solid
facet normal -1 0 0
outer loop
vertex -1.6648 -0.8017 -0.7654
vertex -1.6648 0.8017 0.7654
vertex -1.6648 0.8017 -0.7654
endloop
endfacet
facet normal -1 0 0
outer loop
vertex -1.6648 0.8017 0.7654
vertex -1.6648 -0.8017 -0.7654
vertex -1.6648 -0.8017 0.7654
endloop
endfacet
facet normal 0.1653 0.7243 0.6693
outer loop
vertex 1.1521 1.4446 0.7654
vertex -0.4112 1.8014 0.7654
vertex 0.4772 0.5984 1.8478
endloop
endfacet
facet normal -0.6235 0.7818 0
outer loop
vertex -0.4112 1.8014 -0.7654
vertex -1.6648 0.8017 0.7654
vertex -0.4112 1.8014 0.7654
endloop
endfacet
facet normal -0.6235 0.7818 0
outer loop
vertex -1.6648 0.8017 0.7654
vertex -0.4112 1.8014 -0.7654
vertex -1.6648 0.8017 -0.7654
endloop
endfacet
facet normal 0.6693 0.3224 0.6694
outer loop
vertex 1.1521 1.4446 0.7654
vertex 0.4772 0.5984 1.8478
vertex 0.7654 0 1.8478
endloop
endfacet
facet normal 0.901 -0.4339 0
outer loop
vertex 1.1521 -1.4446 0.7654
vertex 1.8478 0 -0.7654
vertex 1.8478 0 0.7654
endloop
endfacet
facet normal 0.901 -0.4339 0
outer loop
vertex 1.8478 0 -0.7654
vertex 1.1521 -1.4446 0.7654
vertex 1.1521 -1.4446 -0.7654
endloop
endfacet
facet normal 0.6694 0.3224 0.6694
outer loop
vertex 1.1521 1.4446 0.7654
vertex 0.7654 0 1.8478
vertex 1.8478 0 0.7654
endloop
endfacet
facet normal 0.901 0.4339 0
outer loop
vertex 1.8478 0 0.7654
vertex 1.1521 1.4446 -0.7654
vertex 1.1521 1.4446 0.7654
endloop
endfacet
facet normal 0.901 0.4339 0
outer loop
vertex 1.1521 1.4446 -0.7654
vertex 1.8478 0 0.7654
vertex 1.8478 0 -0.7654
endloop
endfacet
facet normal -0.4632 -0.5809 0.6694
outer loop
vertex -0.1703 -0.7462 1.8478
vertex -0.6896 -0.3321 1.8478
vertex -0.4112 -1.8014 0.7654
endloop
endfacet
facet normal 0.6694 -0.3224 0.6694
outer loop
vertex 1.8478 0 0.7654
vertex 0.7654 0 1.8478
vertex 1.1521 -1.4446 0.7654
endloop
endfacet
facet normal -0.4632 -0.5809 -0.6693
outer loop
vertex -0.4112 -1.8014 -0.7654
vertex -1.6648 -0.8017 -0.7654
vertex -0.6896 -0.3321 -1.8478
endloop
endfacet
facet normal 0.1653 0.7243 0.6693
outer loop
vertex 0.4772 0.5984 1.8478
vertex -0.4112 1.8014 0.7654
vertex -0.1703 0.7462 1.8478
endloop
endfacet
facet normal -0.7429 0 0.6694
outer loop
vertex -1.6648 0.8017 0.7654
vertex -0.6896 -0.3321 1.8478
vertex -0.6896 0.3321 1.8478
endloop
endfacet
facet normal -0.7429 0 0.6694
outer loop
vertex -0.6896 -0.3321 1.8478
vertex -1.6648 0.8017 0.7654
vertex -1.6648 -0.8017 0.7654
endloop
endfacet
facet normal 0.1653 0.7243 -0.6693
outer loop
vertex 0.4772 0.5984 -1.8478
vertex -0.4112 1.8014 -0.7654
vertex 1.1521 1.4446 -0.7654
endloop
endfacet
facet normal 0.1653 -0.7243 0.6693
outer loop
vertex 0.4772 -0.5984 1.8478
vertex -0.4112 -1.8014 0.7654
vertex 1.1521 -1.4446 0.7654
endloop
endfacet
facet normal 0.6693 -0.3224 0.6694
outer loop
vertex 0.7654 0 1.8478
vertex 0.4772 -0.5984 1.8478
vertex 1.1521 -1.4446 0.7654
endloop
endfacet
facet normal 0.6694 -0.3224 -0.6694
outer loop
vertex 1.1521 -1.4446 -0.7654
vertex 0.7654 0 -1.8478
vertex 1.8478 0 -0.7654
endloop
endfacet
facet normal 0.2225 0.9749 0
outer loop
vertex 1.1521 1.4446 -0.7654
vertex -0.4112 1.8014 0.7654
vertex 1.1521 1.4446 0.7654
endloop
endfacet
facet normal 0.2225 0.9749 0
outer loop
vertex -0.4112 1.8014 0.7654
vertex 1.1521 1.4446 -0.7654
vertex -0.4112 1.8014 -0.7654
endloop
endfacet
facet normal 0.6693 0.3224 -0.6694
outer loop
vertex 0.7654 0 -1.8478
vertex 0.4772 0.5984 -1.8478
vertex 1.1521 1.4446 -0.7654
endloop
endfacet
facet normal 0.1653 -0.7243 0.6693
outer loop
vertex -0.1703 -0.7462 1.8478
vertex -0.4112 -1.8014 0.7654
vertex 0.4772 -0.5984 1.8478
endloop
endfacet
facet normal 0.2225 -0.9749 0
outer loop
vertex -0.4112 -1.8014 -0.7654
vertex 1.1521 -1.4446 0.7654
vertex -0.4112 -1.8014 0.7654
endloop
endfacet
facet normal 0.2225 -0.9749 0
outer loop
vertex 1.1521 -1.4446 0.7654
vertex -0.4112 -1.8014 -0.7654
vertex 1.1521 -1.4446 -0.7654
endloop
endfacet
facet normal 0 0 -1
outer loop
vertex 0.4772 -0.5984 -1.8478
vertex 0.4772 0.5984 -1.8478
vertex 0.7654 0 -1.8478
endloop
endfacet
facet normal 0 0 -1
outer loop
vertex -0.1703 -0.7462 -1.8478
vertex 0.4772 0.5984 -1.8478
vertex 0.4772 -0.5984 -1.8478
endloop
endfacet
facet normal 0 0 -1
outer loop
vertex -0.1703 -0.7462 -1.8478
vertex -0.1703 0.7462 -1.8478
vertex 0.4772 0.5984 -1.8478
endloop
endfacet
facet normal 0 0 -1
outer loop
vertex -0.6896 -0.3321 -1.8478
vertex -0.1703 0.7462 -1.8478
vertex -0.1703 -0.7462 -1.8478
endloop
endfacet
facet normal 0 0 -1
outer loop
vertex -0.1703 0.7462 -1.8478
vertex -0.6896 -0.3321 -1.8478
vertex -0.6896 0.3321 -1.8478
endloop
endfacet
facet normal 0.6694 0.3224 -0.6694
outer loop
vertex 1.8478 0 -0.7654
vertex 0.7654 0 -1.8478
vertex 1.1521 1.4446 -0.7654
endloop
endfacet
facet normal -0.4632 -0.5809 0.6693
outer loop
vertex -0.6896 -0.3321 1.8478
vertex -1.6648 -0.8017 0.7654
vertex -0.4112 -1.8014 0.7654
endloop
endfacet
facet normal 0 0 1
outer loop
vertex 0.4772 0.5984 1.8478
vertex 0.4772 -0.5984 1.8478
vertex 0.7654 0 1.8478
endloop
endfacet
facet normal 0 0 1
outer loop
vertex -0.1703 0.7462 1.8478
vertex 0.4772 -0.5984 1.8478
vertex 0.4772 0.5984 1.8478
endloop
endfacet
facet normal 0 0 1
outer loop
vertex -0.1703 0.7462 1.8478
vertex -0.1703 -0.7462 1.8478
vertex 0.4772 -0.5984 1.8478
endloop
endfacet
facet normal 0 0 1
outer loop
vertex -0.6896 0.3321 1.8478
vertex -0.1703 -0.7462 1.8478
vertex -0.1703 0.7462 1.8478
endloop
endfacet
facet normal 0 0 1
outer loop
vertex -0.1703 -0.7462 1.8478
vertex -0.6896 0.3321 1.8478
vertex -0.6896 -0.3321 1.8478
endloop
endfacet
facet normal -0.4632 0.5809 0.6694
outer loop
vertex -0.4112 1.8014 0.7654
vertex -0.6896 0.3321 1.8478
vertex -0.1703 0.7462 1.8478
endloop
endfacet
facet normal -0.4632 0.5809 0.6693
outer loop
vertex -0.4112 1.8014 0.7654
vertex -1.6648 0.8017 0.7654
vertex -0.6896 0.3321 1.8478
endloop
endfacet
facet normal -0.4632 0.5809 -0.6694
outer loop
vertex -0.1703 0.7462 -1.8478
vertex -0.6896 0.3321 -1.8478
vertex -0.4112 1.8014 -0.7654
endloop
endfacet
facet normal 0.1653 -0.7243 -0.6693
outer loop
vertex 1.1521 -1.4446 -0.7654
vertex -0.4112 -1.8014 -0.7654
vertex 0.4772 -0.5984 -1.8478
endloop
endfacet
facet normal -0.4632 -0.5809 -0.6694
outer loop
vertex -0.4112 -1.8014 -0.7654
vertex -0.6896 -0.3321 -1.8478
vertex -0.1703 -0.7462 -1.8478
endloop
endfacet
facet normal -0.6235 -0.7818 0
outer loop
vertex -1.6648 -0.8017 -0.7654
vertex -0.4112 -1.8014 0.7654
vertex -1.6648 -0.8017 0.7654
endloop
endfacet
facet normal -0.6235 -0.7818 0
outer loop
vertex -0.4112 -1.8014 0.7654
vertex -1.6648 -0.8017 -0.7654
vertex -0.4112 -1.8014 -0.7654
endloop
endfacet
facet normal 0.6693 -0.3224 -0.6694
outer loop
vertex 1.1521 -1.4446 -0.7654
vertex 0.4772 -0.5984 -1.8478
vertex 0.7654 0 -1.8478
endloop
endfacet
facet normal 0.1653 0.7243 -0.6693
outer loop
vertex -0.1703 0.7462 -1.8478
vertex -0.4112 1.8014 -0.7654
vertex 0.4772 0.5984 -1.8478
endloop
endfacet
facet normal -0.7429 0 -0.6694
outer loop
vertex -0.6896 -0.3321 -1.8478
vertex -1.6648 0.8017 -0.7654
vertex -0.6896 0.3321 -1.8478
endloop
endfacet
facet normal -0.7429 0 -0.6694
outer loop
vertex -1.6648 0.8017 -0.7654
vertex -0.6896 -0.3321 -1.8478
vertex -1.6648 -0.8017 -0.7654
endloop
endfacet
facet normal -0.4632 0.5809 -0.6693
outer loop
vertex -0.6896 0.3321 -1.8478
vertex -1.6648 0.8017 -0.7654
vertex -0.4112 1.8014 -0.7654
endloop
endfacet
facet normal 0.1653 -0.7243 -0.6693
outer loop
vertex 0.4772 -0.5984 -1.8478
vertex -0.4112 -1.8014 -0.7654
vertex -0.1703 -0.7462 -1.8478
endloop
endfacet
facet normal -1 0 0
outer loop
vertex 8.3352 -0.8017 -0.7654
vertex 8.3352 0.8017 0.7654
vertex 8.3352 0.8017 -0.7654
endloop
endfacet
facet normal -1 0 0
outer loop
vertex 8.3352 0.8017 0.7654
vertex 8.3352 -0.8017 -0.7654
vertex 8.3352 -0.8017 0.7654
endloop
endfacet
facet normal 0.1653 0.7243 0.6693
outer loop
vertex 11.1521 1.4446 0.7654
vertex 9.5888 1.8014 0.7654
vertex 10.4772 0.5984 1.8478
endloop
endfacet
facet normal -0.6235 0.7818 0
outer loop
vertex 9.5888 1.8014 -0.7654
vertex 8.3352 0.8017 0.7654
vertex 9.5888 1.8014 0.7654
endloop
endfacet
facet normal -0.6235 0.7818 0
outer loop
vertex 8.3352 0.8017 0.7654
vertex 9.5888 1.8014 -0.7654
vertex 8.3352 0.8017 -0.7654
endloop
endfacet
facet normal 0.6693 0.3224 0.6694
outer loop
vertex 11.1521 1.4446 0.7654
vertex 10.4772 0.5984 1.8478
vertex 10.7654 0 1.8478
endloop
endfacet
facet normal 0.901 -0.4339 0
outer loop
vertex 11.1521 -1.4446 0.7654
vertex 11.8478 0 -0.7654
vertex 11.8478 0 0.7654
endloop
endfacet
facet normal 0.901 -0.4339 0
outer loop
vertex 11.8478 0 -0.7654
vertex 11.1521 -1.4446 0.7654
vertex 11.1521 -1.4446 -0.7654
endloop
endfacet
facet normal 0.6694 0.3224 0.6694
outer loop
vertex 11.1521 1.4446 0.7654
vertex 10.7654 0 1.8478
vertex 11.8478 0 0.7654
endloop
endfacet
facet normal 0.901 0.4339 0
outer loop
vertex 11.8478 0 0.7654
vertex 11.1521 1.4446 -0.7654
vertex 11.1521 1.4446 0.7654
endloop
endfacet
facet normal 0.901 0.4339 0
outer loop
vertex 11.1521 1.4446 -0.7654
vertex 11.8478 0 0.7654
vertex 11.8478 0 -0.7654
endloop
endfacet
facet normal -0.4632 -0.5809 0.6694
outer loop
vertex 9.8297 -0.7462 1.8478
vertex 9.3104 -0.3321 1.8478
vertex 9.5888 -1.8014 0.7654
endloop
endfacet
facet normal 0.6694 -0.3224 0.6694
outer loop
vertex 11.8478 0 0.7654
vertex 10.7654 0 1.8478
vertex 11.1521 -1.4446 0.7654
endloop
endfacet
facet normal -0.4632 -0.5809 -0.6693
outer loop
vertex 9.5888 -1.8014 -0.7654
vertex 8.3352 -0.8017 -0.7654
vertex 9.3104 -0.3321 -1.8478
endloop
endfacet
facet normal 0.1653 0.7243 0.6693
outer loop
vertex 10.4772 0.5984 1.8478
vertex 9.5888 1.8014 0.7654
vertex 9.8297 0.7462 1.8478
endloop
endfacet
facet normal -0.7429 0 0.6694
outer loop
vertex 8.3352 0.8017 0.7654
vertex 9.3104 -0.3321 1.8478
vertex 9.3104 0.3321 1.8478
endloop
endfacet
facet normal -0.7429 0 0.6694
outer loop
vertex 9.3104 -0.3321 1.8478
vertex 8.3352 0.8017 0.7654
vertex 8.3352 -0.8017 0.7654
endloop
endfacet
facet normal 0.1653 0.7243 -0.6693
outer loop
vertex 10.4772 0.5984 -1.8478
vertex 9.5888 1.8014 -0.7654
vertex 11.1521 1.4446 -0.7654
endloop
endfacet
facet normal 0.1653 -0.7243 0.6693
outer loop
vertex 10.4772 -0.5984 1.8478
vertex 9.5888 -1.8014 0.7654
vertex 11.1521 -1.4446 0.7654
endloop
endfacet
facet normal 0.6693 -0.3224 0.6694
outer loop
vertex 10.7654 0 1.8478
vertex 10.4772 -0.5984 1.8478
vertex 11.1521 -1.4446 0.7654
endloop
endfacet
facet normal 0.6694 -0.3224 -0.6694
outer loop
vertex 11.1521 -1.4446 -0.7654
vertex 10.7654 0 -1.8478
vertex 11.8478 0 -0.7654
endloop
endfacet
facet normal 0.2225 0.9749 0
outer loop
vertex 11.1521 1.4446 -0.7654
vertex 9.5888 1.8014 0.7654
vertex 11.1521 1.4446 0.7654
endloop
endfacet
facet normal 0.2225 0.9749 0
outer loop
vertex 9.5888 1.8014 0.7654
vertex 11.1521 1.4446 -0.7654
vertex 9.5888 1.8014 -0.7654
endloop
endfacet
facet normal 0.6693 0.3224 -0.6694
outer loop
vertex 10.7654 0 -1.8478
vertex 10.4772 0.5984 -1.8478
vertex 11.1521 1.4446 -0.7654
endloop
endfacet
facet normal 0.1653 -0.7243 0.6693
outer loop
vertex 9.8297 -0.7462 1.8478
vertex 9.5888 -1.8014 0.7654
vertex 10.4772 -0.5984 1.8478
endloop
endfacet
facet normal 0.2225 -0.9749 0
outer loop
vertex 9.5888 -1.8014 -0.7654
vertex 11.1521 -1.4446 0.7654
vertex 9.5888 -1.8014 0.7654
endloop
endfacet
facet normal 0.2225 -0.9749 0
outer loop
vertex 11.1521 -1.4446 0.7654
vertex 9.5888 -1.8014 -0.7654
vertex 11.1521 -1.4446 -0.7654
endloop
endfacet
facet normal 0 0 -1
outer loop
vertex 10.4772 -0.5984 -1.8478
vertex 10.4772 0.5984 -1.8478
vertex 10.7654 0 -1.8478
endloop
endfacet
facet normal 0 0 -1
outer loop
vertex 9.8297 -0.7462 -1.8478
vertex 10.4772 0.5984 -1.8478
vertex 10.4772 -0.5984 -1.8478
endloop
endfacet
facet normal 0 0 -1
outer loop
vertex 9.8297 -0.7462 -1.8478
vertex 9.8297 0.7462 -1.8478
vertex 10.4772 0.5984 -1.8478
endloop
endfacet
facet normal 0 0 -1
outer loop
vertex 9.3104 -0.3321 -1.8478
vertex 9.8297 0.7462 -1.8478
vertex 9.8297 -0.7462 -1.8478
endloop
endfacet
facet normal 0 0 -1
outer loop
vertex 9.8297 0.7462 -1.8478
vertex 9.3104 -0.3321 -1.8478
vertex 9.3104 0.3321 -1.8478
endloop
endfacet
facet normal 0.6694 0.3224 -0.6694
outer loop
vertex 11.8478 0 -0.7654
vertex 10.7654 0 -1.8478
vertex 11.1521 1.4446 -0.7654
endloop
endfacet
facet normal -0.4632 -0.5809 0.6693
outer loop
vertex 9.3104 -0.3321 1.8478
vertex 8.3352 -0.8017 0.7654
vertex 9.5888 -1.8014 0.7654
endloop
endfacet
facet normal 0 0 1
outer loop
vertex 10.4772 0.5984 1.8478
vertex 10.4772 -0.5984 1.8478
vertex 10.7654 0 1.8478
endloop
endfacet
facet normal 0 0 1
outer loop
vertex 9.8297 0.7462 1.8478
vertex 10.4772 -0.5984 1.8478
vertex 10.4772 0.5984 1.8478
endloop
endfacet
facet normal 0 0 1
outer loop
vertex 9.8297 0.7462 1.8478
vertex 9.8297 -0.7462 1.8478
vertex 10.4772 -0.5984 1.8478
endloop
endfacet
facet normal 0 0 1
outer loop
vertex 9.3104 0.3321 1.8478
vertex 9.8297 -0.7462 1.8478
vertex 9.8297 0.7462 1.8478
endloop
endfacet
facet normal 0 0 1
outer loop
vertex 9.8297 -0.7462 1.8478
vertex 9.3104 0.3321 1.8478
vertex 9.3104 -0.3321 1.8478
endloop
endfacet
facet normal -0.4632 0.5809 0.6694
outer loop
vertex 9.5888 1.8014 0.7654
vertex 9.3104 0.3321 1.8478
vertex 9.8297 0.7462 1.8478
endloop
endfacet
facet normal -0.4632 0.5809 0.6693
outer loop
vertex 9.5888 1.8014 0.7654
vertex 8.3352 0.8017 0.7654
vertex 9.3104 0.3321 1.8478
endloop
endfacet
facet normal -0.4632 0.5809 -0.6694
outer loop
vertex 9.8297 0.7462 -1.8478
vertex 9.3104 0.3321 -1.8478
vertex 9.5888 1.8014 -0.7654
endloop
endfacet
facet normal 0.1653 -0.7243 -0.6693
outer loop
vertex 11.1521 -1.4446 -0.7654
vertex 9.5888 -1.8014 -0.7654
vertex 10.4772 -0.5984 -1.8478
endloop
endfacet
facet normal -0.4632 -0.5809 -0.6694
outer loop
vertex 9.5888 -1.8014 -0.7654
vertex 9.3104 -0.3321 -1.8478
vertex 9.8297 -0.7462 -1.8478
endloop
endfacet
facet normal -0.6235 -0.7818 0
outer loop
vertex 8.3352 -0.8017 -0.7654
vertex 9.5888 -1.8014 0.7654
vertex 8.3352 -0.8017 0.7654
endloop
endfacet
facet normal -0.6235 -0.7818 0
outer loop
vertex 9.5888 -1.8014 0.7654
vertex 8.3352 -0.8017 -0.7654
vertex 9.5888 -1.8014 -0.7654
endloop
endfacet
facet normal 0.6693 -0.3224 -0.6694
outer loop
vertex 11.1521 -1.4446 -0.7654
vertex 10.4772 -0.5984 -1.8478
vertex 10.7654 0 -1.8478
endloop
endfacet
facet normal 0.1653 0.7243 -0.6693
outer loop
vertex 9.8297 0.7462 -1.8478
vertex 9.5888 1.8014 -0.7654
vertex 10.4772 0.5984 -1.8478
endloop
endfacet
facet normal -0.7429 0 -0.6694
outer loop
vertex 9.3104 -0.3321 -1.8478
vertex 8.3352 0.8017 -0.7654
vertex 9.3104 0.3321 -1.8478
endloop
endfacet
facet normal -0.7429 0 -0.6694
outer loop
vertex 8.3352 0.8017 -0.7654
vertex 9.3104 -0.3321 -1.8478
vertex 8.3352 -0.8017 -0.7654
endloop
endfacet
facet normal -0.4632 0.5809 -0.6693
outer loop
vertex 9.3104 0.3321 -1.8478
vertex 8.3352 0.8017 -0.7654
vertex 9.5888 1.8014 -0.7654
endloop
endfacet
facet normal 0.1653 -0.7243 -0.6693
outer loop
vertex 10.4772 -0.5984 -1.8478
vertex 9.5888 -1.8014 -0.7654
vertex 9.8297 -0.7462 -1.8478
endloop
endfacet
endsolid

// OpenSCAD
module wrapperModule0() {
union() {
	difference() {
		children(3);
		union() {
			circle(r = 5);
			children(2);
			children(2);
			children(0);
			children(1);
		}
	}
	translate(v = [10, 0, 0]) {
		children(3);
	}
}
}
module wrapperModule1() {
wrapperModule0(){children(0);children(1);children(2);union() {
	children(0);
	children(1);
}
}}
module wrapperModule2() {
wrapperModule1(){children(0);children(1);cube(size = 2);
}}
module wrapperModule3() {
wrapperModule2(){children(0);sphere(r = 2);
}}
module wrapperModule4() {
wrapperModule3(){cube(size = 1);
}}
wrapperModule4(){};
